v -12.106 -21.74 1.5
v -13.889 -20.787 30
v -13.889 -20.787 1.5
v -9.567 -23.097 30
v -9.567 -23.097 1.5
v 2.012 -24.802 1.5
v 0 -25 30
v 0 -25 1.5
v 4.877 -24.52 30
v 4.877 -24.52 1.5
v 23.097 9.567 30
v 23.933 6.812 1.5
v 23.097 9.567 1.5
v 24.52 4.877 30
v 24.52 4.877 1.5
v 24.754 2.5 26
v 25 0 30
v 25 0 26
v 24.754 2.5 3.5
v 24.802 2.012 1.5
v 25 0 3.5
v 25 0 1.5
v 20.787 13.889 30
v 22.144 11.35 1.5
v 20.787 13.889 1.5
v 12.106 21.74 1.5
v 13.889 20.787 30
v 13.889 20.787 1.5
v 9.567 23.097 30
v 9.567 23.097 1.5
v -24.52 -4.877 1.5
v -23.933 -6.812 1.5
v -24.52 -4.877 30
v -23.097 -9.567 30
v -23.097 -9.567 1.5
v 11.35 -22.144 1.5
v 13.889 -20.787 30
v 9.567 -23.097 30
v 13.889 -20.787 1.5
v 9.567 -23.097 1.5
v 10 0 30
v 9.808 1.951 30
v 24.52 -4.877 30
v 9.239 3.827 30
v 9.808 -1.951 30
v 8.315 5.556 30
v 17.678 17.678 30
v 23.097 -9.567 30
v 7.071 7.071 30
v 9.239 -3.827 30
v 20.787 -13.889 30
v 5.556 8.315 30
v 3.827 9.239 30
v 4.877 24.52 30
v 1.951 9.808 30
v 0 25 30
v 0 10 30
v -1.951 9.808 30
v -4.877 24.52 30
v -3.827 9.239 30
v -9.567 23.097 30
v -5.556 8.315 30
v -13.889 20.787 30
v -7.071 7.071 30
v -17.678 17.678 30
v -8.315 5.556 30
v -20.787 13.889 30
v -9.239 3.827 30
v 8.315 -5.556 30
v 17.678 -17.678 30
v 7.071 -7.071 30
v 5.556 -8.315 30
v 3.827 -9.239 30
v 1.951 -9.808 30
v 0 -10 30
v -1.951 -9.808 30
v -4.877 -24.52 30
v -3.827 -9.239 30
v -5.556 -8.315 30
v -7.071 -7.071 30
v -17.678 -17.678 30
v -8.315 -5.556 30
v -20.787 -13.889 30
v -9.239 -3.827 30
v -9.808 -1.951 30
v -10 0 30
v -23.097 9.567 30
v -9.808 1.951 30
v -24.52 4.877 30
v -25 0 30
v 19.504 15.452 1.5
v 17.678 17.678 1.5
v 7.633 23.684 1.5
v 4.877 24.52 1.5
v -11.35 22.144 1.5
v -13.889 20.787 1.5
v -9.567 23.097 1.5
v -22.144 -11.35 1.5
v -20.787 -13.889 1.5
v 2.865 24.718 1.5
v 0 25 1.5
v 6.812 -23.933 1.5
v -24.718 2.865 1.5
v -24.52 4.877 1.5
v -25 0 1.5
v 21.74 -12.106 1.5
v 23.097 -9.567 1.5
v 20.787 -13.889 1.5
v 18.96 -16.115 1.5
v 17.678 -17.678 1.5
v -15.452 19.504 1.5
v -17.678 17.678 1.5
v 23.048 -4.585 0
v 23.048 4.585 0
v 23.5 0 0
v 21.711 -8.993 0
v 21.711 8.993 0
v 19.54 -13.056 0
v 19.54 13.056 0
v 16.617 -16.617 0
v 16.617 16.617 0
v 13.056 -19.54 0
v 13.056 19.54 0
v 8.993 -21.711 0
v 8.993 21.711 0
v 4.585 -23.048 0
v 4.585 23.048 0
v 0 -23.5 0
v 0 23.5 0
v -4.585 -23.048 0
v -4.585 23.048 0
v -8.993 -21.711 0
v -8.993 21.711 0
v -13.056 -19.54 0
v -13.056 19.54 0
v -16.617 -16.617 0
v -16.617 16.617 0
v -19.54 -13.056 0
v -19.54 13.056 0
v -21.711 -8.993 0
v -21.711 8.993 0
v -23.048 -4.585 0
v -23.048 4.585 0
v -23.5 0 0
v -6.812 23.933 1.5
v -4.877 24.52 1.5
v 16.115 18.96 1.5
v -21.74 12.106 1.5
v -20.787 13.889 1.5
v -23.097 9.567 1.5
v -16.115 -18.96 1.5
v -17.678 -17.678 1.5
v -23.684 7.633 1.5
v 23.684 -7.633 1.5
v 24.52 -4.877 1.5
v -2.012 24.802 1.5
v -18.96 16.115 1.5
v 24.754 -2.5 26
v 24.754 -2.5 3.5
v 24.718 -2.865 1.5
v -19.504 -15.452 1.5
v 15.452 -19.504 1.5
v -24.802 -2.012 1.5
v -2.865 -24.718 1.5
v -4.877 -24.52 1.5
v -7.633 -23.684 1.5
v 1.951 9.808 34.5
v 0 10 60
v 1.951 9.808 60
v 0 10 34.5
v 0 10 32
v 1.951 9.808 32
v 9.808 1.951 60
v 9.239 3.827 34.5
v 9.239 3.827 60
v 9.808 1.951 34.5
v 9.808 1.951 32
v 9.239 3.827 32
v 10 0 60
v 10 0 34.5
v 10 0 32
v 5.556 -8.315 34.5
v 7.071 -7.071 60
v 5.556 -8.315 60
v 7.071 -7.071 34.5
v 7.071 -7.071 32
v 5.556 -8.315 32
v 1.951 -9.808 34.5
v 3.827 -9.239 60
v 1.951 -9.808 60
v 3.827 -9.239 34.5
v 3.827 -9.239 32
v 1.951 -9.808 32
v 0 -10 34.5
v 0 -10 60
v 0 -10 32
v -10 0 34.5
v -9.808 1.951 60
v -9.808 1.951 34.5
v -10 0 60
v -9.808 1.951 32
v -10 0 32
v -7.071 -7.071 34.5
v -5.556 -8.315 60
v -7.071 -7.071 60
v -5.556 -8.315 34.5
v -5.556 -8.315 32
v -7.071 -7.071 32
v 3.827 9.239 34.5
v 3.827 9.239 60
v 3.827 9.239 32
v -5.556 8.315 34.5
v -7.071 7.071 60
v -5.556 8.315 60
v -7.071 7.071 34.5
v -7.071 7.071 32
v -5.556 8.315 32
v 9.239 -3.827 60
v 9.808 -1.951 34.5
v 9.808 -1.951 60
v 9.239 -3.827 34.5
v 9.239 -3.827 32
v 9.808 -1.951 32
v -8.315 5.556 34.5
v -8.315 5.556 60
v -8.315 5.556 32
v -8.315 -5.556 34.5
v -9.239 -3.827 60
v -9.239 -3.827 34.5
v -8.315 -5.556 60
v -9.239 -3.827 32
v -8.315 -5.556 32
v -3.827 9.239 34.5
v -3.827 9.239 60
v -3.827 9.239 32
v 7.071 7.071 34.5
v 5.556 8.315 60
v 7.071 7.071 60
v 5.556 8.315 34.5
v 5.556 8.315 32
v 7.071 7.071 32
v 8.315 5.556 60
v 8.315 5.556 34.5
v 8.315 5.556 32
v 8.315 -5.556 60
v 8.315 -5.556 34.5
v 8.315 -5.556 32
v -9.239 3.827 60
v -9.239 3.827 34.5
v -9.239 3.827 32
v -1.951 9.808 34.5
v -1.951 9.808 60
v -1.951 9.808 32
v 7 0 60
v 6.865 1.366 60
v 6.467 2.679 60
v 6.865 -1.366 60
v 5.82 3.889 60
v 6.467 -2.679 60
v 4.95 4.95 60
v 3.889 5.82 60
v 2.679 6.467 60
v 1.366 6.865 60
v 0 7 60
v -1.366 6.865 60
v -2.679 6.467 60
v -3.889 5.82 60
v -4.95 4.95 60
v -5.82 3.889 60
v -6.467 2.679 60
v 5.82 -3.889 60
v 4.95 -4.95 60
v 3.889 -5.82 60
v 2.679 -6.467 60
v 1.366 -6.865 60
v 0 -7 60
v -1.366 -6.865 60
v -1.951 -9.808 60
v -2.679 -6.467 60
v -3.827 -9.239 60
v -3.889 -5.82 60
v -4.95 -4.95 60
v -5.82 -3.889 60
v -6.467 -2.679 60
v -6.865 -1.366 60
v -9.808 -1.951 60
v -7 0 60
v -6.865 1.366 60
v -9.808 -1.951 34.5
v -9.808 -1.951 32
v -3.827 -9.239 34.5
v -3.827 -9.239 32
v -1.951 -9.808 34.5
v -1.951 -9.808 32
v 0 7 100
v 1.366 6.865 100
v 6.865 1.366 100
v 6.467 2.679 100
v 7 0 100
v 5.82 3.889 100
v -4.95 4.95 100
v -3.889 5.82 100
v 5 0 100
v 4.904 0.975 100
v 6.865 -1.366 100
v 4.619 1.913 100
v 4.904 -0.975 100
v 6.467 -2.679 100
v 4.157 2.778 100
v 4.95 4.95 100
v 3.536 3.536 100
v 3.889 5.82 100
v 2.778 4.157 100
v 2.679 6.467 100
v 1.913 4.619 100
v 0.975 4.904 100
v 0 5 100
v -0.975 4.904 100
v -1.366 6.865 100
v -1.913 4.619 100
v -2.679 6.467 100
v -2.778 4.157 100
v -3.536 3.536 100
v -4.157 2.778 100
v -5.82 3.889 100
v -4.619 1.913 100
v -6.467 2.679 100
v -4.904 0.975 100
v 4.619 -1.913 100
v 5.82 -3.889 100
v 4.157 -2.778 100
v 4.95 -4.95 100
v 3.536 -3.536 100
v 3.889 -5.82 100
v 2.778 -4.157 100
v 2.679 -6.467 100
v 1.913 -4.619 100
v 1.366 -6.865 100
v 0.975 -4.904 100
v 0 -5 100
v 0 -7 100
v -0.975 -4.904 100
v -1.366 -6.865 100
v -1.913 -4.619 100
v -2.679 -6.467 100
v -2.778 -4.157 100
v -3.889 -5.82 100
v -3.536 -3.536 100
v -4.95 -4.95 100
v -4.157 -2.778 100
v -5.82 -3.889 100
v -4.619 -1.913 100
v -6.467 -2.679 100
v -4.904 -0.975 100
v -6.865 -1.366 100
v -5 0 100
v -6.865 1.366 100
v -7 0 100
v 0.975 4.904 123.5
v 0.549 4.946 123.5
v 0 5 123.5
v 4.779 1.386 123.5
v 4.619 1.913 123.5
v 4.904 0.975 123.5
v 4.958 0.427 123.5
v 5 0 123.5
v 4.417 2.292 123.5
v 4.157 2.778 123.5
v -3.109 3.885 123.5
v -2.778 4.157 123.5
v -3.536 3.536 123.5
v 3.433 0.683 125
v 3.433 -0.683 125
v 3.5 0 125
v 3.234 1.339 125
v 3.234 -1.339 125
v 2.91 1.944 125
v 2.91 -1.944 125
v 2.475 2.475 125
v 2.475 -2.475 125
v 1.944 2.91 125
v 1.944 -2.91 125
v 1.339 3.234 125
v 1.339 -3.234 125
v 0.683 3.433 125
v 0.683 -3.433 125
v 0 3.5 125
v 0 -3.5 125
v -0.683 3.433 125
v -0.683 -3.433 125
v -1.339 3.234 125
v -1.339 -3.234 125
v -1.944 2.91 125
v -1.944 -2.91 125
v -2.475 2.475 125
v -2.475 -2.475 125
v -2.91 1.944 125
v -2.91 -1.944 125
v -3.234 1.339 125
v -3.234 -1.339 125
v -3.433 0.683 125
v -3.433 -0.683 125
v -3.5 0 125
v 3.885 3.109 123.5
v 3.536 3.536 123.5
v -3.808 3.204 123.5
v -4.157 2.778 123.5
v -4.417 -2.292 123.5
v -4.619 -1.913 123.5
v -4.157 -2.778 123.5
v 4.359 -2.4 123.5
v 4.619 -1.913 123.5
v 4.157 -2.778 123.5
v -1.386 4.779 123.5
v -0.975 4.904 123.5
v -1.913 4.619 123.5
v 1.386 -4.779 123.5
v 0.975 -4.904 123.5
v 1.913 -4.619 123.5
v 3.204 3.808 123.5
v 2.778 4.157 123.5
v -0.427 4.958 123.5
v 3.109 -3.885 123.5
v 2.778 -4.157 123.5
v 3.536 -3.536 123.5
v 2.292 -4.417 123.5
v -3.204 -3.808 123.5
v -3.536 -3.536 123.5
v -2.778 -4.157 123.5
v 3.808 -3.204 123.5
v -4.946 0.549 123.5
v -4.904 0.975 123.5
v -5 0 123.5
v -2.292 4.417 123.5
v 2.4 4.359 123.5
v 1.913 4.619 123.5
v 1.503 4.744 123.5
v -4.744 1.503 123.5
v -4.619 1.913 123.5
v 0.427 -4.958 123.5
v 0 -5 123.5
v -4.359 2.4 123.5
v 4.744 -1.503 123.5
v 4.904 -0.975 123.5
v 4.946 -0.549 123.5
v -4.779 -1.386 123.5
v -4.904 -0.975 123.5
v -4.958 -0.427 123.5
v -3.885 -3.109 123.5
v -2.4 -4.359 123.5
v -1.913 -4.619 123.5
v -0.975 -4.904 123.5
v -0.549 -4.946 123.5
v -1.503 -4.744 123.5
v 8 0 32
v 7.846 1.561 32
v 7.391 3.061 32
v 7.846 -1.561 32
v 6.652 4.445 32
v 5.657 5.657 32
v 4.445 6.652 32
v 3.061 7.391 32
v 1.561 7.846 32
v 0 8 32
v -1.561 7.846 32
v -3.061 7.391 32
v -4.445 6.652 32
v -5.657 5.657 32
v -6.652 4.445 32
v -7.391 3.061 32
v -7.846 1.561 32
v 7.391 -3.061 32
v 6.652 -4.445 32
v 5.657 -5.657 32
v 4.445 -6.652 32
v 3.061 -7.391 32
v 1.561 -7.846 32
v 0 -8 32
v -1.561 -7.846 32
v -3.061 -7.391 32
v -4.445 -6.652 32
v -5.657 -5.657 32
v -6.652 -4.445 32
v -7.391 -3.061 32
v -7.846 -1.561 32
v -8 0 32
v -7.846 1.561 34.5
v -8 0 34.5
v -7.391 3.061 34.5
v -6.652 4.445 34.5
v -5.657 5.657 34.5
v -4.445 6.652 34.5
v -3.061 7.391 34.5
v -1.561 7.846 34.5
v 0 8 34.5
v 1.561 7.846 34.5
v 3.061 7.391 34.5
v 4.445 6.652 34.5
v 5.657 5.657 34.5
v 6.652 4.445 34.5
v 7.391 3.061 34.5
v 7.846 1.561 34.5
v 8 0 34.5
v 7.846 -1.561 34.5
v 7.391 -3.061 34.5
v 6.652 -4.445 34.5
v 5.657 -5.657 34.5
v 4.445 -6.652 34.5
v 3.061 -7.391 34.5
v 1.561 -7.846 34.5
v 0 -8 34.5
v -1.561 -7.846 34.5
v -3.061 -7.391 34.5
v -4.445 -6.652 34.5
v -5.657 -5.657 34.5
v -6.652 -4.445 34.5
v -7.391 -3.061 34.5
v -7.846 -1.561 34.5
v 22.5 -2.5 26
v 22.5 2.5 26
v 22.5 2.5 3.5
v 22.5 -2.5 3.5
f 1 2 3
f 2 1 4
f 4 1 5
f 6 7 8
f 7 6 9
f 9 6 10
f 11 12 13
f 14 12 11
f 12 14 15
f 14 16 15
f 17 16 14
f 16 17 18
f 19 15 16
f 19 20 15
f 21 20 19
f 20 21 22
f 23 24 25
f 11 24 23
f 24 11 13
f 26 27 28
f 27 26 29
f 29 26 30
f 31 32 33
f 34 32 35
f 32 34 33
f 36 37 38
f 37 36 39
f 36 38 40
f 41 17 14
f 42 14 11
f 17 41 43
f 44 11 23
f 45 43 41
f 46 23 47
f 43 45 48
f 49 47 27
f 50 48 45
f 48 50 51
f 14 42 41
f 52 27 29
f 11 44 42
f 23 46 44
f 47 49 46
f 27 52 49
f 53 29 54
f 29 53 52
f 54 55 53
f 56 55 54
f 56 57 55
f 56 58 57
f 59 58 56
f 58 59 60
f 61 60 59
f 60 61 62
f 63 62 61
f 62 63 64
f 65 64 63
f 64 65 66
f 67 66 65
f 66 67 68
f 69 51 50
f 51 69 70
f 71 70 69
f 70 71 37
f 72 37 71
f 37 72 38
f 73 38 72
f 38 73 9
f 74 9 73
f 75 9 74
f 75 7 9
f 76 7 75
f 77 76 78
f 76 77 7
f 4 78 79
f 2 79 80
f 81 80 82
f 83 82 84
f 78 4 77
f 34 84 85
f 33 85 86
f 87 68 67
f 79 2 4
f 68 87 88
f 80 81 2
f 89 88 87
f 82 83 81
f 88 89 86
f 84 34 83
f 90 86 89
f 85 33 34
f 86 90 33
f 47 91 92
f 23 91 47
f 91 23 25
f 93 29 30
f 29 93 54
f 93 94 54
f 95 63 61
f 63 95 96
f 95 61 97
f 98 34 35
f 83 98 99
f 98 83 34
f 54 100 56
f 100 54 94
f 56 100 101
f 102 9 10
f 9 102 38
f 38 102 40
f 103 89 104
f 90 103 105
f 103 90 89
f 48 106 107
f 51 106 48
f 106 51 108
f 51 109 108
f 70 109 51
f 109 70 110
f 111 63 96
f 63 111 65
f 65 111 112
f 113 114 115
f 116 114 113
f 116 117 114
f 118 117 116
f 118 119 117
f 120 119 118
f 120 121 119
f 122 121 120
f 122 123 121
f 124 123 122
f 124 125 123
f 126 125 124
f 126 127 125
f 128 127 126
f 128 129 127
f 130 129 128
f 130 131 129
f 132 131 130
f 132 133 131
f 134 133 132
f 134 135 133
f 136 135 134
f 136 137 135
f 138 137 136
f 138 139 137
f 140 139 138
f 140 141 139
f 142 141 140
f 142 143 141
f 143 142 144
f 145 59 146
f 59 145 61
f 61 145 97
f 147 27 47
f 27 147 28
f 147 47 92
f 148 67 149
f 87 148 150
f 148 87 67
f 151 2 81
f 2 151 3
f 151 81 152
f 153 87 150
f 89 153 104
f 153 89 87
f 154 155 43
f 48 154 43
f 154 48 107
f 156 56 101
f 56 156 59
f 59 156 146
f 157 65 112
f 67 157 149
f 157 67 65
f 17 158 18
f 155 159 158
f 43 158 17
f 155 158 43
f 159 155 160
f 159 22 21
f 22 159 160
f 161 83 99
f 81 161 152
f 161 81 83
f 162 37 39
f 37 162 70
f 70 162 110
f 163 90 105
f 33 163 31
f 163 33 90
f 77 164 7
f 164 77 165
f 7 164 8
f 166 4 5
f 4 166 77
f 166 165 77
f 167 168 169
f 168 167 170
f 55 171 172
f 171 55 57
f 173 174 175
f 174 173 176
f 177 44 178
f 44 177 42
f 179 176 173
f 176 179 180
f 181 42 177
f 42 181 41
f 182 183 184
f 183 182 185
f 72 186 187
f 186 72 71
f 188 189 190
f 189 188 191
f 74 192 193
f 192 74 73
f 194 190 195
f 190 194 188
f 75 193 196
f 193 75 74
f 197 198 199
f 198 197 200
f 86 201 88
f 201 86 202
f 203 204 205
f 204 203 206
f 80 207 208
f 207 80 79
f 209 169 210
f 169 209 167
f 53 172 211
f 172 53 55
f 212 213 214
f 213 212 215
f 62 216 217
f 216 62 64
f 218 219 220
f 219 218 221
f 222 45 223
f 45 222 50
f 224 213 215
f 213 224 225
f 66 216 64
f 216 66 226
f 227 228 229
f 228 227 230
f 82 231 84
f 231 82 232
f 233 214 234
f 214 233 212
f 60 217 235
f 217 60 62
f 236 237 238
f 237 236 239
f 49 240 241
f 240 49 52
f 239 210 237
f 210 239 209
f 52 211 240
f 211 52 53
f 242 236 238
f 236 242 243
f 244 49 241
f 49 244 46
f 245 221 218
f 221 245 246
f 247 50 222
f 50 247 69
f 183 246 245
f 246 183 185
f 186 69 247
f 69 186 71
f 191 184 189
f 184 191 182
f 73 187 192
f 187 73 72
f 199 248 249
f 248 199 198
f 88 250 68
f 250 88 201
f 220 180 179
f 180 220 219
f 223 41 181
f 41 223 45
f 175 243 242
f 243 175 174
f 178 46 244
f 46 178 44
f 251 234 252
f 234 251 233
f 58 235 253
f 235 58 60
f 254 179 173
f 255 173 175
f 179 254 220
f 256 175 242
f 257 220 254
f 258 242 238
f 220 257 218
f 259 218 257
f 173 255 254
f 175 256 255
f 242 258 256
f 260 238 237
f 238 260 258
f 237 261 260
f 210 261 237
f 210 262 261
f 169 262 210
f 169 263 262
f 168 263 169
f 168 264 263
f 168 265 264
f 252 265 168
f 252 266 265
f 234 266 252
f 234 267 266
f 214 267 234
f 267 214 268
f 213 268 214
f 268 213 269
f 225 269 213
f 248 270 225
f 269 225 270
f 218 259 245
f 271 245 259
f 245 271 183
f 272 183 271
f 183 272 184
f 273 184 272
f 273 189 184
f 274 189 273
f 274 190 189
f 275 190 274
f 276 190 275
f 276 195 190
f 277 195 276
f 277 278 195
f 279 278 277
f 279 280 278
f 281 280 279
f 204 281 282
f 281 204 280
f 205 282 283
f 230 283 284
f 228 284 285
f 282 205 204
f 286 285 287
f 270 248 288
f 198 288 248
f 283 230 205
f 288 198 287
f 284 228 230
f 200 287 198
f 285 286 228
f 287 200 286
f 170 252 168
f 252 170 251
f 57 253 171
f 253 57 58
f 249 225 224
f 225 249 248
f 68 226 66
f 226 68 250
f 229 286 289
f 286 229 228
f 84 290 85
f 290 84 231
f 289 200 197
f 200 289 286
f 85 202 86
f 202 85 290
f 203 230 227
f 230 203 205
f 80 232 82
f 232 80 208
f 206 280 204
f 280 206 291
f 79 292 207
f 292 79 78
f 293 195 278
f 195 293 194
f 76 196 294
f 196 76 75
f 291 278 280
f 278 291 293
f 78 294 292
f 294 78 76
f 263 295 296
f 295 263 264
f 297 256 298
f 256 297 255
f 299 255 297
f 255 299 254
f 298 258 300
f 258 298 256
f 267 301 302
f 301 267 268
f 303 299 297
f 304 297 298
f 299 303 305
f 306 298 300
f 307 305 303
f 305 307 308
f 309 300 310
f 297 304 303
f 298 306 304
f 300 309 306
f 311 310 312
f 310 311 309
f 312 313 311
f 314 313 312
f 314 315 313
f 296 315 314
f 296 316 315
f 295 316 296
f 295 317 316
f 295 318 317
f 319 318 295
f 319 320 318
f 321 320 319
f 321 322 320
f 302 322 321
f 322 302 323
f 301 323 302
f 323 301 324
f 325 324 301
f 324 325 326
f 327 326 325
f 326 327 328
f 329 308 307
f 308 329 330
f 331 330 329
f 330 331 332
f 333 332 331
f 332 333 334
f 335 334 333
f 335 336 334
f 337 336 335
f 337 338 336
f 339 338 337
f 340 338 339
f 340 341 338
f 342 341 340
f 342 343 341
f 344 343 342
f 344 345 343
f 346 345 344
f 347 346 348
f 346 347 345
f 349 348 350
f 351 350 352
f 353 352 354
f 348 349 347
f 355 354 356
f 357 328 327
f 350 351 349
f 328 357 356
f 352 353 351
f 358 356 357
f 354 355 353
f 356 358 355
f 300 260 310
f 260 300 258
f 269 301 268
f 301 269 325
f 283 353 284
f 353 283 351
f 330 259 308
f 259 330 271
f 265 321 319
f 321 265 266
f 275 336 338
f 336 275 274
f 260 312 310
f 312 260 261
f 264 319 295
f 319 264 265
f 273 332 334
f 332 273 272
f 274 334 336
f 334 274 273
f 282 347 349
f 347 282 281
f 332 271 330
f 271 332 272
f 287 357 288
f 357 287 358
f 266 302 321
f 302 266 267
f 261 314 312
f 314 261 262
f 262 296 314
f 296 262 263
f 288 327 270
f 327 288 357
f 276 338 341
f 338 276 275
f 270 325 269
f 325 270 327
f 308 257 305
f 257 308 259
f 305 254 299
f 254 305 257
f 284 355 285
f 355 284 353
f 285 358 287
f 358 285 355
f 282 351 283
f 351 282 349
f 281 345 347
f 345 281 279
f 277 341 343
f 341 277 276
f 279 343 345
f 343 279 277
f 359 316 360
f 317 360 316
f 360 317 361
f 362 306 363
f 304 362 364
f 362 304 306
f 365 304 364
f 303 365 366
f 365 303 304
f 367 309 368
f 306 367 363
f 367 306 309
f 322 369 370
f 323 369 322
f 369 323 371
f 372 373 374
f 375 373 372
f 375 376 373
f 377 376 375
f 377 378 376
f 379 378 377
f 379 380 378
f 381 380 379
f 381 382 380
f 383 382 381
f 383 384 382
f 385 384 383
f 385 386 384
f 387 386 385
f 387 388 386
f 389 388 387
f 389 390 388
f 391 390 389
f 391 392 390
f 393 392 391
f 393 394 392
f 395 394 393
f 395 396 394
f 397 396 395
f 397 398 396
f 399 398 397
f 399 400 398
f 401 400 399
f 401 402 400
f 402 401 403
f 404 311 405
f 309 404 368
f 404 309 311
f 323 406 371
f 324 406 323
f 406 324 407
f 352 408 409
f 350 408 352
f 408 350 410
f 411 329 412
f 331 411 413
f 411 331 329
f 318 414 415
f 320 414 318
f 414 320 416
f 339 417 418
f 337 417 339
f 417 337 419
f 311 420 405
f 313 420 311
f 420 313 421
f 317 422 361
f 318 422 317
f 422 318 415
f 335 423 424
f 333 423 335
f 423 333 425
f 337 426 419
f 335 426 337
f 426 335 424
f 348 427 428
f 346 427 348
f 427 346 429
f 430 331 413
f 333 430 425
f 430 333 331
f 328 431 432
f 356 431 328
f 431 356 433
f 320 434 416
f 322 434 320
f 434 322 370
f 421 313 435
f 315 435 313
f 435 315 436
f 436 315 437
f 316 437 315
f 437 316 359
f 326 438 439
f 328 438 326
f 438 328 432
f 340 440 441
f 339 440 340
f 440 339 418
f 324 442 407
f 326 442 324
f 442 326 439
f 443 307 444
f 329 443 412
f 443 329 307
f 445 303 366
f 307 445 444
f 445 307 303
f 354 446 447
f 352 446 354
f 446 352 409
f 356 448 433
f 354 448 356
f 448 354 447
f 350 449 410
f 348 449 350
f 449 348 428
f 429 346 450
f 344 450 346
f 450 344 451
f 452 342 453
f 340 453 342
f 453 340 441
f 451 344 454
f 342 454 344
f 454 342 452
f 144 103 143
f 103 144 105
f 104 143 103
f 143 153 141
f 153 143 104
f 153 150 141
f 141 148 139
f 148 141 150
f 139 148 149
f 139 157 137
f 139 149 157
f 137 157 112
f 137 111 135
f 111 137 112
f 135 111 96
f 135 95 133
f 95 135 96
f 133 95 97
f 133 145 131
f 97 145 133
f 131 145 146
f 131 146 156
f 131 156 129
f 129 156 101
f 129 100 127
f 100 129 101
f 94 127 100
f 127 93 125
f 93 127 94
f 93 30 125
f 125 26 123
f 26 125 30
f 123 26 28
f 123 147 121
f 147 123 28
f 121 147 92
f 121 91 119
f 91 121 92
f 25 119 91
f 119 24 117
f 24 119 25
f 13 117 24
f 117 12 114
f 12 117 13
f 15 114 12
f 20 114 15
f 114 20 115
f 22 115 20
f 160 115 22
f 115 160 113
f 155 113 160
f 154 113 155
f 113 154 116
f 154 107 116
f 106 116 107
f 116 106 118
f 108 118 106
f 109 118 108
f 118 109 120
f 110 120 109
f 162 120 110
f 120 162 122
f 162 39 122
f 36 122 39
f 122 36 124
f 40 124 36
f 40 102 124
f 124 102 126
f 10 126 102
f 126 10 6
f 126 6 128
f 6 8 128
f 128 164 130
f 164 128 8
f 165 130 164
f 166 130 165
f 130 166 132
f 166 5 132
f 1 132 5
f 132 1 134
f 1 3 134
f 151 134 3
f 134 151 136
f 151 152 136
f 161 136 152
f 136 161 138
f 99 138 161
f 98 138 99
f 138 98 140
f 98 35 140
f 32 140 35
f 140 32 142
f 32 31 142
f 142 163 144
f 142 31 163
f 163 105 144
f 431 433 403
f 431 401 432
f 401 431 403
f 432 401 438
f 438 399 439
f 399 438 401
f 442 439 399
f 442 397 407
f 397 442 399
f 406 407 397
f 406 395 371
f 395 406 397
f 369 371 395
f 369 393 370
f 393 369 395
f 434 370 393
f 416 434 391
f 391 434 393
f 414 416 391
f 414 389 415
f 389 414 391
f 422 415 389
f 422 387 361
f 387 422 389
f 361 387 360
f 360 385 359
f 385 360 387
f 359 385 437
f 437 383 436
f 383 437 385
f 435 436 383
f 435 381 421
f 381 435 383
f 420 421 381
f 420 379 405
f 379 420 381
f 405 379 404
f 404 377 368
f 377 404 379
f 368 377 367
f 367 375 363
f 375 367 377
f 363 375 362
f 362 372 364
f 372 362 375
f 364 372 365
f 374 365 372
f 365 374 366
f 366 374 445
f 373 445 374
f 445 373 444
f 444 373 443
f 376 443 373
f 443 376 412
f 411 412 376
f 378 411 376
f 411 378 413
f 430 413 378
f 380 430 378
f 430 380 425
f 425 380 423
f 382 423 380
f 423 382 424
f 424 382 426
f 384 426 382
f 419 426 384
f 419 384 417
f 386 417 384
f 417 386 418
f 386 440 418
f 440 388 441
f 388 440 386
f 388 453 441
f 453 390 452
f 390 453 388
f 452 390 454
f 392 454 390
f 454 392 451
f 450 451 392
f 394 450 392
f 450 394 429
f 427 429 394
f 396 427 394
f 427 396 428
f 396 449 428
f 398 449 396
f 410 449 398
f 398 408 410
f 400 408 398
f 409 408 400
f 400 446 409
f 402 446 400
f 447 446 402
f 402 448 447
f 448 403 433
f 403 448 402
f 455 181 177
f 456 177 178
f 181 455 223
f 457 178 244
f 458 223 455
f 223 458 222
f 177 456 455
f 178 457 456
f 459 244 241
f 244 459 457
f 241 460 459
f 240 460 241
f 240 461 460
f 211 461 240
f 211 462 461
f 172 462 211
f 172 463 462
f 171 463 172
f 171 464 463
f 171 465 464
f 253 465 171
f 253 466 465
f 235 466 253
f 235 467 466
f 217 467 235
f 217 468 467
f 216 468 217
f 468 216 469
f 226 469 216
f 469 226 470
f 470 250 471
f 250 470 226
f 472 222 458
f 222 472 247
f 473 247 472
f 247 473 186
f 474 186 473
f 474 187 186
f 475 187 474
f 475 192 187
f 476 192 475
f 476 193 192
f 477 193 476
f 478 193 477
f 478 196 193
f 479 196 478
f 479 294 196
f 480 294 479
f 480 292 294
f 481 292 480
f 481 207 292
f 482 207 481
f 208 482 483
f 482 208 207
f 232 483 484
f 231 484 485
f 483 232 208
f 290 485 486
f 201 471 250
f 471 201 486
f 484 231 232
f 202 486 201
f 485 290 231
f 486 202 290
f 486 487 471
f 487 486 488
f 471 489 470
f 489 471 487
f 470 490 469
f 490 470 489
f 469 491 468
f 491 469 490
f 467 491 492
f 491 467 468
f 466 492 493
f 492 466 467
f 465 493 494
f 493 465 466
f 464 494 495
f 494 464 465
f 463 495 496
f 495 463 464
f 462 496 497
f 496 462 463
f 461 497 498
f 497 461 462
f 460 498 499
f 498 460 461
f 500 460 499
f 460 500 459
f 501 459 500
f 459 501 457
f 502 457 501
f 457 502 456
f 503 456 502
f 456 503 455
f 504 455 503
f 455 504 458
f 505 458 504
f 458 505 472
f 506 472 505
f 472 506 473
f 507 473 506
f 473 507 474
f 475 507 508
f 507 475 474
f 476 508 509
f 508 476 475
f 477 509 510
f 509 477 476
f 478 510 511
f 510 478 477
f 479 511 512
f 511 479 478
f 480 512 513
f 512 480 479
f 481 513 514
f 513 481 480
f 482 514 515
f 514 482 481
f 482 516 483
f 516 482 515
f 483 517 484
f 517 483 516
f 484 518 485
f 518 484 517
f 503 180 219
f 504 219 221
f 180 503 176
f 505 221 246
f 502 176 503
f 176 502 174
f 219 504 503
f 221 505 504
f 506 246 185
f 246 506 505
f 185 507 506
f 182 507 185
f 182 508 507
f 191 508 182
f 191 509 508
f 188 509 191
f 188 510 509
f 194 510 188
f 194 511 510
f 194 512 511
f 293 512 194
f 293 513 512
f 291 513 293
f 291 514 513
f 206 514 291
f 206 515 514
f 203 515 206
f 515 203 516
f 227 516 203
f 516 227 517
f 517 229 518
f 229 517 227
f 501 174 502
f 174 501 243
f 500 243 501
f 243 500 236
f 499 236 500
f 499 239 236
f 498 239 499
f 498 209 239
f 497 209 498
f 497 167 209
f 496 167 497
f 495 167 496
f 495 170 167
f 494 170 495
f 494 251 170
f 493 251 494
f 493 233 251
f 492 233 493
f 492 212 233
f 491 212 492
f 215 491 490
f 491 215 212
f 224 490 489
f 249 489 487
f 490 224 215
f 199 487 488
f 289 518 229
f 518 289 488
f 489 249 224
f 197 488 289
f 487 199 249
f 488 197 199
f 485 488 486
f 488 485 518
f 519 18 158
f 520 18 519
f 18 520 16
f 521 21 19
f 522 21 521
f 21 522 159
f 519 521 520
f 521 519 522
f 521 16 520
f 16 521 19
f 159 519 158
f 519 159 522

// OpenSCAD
$fn = 32;

// ----------------------------------------------------------------------
// Stepped shaft: diameters 50, 20, 14, 10 mm, 125 mm long
// ----------------------------------------------------------------------

// --- parameters (mm) ---
d1 = 50;                  // step 1 diameter
len1 = 30;                // step 1 length
d2 = 20;                  // step 2 diameter
len2 = 30;                // step 2 length
d3 = 14;                  // step 3 diameter
len3 = 40;                // step 3 length
d4 = 10;                  // step 4 diameter
len4 = 25;                // step 4 length
total = 125;              // overall length
chamfer = 1.5;            // end chamfer
groove_r = 10;            // groove radius
groove_z = 32;            // groove position from the end
groove_w = 2.5;           // groove width
groove_d = 2;             // groove depth
key_w = 5;                // keyway width
key_d = 2.5;              // keyway depth
key_len = 22.5;           // keyway length
key_z = 3.5;              // keyway start along the shaft

difference() {
  /* turned body: stacked cylinders, every step sunk into the bigger one */
  union() {
    cylinder(h = len1, d = d1);
    translate([0, 0, 29.6]) cylinder(h = 30.4, d = d2);
    translate([0, 0, 59.6]) cylinder(h = 40.4, d = d3);
    translate([0, 0, 99.6]) cylinder(h = 25.4, d = d4);
  }
  /* bottom chamfer ring cut */
  rotate_extrude() translate([23.5, -2.5]) polygon([[0, 0], [4, 0], [4, 6.5], [0, 2.5]]);
  /* top chamfer ring cut */
  rotate_extrude() translate([3.5, 125]) polygon([[0, 0], [4, -4], [4, 2.5], [0, 2.5]]);
  /* circlip groove just behind the shoulder */
  rotate_extrude() translate([groove_r - groove_d, groove_z]) square([groove_d + 2.5, groove_w]);
  /* keyway milled along the first step */
  translate([d1 / 2 - key_d, -key_w / 2, key_z]) cube([key_d + 2.5, key_w, key_len]);
}
